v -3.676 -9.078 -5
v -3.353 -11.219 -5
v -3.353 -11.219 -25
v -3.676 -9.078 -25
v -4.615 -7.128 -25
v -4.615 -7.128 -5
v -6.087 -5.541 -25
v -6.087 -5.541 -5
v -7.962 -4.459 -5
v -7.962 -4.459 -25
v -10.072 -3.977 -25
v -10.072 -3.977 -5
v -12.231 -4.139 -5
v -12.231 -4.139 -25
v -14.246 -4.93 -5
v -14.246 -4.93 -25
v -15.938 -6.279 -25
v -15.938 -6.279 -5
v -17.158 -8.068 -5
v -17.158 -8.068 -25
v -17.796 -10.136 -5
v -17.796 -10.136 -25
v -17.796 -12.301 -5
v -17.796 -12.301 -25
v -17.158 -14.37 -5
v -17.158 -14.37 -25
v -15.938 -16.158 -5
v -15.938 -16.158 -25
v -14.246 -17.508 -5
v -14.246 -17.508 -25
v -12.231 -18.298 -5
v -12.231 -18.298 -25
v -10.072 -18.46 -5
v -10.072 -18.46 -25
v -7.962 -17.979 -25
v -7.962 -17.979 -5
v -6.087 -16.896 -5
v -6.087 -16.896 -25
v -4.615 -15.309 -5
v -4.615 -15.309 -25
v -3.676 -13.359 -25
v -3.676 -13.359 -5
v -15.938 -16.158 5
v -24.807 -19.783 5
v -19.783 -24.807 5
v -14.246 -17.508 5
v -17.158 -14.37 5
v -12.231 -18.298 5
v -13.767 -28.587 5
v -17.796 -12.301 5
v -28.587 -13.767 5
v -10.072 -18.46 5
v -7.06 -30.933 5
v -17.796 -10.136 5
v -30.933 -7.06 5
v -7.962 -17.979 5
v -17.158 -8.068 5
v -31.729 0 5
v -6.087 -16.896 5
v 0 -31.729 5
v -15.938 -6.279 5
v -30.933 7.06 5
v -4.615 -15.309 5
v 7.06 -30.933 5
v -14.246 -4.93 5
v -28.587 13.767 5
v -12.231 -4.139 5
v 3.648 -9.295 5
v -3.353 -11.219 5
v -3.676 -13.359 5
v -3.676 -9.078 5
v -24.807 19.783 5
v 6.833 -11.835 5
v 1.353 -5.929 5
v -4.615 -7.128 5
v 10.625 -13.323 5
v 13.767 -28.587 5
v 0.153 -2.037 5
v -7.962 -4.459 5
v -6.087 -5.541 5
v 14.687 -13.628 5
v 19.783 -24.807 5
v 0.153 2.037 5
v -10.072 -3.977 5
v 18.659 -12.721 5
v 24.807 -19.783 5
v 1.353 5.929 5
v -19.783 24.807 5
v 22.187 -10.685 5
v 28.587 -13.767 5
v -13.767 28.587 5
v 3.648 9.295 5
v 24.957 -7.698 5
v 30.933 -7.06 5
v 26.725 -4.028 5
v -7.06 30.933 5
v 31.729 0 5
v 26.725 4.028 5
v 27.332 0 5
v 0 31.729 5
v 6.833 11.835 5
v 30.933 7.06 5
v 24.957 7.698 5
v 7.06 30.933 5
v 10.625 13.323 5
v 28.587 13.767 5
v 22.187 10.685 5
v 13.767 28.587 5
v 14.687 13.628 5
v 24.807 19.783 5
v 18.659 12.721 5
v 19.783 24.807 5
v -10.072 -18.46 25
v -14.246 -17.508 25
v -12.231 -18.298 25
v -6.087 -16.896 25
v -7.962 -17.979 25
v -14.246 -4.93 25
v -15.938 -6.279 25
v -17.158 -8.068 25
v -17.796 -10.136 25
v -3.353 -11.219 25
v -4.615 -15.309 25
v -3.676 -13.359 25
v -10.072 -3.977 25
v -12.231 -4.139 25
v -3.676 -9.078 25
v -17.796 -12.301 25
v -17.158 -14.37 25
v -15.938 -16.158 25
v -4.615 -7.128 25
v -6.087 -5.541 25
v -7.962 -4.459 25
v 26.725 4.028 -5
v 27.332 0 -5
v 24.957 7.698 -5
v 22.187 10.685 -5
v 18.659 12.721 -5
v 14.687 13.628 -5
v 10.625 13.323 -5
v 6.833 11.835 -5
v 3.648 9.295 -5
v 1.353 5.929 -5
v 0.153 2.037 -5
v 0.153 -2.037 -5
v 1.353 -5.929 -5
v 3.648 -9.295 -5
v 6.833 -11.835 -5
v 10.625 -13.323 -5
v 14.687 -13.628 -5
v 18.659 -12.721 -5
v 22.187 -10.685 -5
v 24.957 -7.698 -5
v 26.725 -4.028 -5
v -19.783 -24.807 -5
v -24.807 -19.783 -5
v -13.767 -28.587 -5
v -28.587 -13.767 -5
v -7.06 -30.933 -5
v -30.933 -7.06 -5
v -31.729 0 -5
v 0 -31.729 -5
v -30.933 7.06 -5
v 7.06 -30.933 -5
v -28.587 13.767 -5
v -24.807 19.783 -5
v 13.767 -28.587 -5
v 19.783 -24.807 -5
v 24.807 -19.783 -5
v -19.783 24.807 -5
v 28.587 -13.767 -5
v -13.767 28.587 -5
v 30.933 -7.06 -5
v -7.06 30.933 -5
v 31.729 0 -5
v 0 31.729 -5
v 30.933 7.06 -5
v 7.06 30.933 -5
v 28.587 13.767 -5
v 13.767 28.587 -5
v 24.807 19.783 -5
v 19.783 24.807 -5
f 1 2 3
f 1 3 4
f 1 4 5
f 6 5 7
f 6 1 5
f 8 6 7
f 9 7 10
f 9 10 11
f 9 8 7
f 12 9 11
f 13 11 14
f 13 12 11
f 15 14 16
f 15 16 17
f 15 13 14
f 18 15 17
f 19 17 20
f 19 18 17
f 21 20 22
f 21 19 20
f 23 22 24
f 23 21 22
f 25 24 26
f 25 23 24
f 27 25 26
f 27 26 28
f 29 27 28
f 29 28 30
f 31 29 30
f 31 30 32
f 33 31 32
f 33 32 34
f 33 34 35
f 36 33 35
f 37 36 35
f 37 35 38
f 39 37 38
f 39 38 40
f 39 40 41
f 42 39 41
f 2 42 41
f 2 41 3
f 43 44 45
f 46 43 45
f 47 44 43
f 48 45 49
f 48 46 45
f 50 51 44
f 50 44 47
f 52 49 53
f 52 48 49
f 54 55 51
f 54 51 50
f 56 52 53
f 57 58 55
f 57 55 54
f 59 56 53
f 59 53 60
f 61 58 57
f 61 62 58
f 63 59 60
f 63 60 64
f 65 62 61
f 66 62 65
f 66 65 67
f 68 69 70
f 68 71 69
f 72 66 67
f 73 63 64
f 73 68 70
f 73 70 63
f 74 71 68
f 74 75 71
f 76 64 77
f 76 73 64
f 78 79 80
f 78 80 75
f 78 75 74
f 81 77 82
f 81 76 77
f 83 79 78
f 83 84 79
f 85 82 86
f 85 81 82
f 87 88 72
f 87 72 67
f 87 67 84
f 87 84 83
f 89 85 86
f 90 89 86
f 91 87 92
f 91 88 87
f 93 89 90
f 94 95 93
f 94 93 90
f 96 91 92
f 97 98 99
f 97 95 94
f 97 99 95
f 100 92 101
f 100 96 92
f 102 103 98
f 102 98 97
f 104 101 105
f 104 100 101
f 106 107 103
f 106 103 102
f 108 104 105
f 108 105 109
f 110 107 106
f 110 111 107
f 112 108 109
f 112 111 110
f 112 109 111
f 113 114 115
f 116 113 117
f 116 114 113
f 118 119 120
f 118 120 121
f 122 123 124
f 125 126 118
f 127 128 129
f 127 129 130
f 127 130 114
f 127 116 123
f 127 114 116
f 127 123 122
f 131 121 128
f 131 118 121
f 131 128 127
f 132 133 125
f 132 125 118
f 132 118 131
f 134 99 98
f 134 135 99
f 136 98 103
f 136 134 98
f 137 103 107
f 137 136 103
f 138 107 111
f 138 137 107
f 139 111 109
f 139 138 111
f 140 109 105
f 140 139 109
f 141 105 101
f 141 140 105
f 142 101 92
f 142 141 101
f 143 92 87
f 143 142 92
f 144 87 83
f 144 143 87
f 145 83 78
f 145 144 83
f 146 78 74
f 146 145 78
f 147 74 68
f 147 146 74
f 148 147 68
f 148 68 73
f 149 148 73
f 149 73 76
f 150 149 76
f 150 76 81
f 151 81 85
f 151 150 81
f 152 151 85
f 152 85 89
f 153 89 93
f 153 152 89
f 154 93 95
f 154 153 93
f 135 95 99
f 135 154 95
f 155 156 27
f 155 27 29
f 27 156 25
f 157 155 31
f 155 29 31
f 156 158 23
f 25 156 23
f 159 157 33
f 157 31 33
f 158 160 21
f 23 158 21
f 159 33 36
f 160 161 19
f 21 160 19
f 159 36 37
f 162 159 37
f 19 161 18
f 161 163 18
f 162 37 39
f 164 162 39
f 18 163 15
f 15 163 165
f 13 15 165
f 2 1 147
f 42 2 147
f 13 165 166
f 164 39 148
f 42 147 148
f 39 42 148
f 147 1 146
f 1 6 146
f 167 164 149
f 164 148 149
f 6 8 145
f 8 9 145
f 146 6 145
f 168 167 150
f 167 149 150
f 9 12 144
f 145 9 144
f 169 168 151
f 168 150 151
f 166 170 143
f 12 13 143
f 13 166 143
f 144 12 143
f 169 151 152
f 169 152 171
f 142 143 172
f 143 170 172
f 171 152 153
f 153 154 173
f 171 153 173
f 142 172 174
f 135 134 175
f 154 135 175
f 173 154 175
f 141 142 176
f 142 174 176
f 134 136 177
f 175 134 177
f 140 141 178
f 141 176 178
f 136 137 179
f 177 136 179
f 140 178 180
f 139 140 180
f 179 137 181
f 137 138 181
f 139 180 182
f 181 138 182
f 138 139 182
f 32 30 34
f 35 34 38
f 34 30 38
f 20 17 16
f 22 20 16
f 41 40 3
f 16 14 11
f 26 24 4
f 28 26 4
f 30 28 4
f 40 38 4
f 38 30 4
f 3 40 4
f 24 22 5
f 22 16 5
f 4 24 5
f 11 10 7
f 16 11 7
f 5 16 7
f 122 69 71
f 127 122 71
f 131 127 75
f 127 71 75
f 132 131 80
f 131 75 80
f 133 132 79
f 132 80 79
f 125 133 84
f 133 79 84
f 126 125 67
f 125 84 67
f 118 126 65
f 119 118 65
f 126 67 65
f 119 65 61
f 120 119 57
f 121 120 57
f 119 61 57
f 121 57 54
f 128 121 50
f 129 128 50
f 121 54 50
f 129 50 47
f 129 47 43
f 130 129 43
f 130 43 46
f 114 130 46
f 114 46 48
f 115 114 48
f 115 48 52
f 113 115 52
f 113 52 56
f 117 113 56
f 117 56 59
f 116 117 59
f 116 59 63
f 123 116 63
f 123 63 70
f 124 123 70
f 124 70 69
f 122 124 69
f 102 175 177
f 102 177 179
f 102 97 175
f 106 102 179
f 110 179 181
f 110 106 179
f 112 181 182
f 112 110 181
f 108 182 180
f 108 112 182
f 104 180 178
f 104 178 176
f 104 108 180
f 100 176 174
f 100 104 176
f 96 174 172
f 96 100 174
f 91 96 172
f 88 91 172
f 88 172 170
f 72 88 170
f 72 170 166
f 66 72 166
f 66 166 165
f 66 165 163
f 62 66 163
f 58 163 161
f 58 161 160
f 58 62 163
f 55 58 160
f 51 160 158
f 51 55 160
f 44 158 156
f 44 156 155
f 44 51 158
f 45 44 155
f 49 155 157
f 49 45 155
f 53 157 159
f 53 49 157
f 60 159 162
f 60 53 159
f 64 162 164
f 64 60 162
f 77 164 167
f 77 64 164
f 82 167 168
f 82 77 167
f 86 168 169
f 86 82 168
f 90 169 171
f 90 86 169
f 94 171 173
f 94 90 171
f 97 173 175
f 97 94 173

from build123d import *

# Parameters (mm, degrees)
F0_R          = 31.728822
F0_R_2        = 13.666047
F1_DEPTH      = 5
F1_DEPTH_BACK = 5
F2_R          = 7.26181
F3_DEPTH      = 25
F3_DEPTH_BACK = 25


with BuildPart() as f1:
    # F0 (on Top) → F1 (new body, two sides)
    with BuildSketch(Plane.XY) as f1_sk:
        Circle(F0_R)
        with Locations((13.666047, 0)):
            Circle(F0_R_2, mode=Mode.SUBTRACT)
    extrude(amount=F1_DEPTH)
    extrude(f1_sk.sketch, amount=-F1_DEPTH_BACK)

    # F2 (on Top) → F3 (join, two sides)
    with BuildSketch(Plane.XY) as f3_sk:
        with Locations((-10.615021, -11.218742)):
            Circle(F2_R)
    extrude(amount=F3_DEPTH)
    extrude(f3_sk.sketch, amount=-F3_DEPTH_BACK)


solid = f1.part
